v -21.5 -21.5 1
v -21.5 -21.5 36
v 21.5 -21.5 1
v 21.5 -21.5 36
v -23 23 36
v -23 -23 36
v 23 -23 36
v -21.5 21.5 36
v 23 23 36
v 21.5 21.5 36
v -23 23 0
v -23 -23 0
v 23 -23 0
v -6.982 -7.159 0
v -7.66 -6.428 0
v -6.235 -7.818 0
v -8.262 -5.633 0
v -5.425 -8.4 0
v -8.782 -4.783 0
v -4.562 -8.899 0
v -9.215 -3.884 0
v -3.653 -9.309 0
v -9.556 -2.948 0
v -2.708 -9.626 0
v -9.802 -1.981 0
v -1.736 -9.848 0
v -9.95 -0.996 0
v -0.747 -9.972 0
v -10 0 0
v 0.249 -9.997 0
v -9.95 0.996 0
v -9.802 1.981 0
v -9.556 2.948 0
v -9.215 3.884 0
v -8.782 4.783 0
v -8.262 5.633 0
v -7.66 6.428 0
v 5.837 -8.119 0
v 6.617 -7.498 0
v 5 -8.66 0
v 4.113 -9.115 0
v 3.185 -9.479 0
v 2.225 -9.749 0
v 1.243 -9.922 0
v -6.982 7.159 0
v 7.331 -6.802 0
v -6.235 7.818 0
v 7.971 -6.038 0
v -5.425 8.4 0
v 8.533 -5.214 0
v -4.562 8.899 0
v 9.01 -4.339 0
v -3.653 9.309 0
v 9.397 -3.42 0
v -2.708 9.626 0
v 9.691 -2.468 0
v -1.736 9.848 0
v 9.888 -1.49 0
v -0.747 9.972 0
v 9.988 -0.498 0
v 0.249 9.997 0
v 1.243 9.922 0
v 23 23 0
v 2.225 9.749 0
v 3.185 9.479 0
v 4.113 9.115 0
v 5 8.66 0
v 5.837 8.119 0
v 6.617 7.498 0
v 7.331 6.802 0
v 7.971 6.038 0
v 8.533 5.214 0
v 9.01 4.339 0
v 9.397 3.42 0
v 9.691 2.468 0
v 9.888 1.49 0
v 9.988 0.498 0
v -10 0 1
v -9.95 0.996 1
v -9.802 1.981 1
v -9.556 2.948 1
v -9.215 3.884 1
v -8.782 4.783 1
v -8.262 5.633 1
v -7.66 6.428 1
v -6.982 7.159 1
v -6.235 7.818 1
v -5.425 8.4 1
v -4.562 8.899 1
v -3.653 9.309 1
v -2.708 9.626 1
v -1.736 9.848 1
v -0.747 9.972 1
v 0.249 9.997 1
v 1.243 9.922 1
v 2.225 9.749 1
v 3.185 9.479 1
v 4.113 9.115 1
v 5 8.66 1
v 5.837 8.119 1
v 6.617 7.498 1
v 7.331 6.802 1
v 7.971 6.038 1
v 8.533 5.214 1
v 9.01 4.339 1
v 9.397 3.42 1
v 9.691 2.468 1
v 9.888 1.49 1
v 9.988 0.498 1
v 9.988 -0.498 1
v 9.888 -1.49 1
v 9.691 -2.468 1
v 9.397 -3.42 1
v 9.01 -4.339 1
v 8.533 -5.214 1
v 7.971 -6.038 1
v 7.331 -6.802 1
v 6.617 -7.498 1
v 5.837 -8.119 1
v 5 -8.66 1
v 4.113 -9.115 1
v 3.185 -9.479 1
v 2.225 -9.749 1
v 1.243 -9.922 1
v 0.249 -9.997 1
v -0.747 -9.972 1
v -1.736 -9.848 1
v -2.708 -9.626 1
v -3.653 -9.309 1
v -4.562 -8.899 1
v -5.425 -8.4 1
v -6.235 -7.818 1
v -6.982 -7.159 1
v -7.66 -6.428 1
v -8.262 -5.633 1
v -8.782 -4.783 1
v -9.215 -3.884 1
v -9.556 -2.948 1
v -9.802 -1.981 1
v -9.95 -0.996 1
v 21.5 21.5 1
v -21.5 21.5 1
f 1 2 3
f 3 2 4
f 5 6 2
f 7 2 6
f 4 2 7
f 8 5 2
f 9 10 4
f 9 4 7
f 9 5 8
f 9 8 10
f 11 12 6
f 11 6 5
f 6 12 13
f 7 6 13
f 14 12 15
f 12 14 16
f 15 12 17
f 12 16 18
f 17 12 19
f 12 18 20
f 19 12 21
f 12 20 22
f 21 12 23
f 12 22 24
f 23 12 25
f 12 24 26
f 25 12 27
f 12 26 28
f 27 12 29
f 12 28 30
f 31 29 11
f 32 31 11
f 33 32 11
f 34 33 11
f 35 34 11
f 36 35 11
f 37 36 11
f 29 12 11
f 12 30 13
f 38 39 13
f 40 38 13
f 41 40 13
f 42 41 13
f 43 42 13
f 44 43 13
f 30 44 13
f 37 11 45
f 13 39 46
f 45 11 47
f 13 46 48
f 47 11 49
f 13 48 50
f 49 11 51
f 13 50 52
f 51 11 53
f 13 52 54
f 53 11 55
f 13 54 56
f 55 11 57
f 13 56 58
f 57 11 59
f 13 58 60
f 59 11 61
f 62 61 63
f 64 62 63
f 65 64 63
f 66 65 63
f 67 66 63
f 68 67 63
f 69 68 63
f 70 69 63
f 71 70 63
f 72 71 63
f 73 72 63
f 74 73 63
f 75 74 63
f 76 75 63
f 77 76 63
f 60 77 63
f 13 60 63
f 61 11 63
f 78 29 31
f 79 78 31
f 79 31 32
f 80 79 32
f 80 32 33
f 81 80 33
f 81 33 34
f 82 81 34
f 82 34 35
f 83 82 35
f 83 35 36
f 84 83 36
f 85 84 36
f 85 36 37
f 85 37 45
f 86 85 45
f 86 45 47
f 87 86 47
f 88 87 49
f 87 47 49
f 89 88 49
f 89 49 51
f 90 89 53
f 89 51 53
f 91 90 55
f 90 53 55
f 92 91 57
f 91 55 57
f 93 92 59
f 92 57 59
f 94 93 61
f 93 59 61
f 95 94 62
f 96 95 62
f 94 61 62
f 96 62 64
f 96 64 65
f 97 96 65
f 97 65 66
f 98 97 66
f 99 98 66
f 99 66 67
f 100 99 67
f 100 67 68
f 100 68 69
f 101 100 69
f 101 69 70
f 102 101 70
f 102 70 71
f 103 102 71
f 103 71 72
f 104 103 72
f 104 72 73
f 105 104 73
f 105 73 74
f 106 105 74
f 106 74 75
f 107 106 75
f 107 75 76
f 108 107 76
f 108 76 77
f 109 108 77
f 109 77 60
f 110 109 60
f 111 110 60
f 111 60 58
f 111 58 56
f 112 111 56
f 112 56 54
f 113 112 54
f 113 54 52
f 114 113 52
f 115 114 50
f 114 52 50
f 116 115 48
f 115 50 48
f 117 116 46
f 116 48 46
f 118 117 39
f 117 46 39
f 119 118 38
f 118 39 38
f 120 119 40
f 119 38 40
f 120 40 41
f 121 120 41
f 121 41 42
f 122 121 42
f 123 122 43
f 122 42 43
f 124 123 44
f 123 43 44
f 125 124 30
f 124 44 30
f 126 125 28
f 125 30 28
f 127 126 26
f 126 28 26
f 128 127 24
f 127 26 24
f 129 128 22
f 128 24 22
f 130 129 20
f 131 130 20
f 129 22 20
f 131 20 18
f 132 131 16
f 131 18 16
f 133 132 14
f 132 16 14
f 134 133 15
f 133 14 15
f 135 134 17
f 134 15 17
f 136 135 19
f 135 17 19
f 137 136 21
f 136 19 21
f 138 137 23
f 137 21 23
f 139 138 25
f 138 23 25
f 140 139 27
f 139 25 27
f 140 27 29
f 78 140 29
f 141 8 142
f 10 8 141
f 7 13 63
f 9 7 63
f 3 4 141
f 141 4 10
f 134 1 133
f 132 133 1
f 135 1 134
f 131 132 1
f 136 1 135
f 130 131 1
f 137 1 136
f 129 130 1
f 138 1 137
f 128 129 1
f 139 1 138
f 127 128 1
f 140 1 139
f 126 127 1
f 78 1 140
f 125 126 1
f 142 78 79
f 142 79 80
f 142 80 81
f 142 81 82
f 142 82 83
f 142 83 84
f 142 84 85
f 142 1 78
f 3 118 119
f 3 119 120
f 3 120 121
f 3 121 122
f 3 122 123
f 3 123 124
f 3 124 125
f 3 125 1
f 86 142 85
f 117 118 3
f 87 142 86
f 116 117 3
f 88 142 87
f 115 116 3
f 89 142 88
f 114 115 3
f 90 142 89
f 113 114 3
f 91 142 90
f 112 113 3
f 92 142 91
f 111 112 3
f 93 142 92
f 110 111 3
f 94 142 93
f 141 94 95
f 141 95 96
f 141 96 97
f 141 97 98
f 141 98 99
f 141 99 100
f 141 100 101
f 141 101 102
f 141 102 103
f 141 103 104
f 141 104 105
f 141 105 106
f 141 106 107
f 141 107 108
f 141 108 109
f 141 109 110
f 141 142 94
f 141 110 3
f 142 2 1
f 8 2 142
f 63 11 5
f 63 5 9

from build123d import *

# Parameters (mm, degrees)
ESQUISSE1_W             = 46
ESQUISSE1_H             = 46
BOSS_EXTRU_1_DEPTH      = 36
ESQUISSE2_W             = 43
ESQUISSE2_H             = 43
ENL_V_MAT_EXTRU_1_DEPTH = 35
ESQUISSE3_R             = 10
ENL_V_MAT_EXTRU_2_DEPTH = 35


with BuildPart() as part:
    # Esquisse1 → Boss.-Extru.1 (new body)
    with BuildSketch(Plane.XY):
        Rectangle(ESQUISSE1_W, ESQUISSE1_H)
    extrude(amount=BOSS_EXTRU_1_DEPTH)

    # Esquisse2 → Enlèv. mat.-Extru.1 (cut)
    with BuildSketch(Plane.XY.offset(36)):
        Rectangle(ESQUISSE2_W, ESQUISSE2_H)
    extrude(amount=-ENL_V_MAT_EXTRU_1_DEPTH, mode=Mode.SUBTRACT)

    # Esquisse3 → Enlèv. mat.-Extru.2 (cut)
    with BuildSketch(Plane(origin=(0, 0, 0), x_dir=(-1, 0, 0), z_dir=(0, 0, -1))):
        Circle(ESQUISSE3_R)
    extrude(amount=-ENL_V_MAT_EXTRU_2_DEPTH, mode=Mode.SUBTRACT)


solid = part.part
